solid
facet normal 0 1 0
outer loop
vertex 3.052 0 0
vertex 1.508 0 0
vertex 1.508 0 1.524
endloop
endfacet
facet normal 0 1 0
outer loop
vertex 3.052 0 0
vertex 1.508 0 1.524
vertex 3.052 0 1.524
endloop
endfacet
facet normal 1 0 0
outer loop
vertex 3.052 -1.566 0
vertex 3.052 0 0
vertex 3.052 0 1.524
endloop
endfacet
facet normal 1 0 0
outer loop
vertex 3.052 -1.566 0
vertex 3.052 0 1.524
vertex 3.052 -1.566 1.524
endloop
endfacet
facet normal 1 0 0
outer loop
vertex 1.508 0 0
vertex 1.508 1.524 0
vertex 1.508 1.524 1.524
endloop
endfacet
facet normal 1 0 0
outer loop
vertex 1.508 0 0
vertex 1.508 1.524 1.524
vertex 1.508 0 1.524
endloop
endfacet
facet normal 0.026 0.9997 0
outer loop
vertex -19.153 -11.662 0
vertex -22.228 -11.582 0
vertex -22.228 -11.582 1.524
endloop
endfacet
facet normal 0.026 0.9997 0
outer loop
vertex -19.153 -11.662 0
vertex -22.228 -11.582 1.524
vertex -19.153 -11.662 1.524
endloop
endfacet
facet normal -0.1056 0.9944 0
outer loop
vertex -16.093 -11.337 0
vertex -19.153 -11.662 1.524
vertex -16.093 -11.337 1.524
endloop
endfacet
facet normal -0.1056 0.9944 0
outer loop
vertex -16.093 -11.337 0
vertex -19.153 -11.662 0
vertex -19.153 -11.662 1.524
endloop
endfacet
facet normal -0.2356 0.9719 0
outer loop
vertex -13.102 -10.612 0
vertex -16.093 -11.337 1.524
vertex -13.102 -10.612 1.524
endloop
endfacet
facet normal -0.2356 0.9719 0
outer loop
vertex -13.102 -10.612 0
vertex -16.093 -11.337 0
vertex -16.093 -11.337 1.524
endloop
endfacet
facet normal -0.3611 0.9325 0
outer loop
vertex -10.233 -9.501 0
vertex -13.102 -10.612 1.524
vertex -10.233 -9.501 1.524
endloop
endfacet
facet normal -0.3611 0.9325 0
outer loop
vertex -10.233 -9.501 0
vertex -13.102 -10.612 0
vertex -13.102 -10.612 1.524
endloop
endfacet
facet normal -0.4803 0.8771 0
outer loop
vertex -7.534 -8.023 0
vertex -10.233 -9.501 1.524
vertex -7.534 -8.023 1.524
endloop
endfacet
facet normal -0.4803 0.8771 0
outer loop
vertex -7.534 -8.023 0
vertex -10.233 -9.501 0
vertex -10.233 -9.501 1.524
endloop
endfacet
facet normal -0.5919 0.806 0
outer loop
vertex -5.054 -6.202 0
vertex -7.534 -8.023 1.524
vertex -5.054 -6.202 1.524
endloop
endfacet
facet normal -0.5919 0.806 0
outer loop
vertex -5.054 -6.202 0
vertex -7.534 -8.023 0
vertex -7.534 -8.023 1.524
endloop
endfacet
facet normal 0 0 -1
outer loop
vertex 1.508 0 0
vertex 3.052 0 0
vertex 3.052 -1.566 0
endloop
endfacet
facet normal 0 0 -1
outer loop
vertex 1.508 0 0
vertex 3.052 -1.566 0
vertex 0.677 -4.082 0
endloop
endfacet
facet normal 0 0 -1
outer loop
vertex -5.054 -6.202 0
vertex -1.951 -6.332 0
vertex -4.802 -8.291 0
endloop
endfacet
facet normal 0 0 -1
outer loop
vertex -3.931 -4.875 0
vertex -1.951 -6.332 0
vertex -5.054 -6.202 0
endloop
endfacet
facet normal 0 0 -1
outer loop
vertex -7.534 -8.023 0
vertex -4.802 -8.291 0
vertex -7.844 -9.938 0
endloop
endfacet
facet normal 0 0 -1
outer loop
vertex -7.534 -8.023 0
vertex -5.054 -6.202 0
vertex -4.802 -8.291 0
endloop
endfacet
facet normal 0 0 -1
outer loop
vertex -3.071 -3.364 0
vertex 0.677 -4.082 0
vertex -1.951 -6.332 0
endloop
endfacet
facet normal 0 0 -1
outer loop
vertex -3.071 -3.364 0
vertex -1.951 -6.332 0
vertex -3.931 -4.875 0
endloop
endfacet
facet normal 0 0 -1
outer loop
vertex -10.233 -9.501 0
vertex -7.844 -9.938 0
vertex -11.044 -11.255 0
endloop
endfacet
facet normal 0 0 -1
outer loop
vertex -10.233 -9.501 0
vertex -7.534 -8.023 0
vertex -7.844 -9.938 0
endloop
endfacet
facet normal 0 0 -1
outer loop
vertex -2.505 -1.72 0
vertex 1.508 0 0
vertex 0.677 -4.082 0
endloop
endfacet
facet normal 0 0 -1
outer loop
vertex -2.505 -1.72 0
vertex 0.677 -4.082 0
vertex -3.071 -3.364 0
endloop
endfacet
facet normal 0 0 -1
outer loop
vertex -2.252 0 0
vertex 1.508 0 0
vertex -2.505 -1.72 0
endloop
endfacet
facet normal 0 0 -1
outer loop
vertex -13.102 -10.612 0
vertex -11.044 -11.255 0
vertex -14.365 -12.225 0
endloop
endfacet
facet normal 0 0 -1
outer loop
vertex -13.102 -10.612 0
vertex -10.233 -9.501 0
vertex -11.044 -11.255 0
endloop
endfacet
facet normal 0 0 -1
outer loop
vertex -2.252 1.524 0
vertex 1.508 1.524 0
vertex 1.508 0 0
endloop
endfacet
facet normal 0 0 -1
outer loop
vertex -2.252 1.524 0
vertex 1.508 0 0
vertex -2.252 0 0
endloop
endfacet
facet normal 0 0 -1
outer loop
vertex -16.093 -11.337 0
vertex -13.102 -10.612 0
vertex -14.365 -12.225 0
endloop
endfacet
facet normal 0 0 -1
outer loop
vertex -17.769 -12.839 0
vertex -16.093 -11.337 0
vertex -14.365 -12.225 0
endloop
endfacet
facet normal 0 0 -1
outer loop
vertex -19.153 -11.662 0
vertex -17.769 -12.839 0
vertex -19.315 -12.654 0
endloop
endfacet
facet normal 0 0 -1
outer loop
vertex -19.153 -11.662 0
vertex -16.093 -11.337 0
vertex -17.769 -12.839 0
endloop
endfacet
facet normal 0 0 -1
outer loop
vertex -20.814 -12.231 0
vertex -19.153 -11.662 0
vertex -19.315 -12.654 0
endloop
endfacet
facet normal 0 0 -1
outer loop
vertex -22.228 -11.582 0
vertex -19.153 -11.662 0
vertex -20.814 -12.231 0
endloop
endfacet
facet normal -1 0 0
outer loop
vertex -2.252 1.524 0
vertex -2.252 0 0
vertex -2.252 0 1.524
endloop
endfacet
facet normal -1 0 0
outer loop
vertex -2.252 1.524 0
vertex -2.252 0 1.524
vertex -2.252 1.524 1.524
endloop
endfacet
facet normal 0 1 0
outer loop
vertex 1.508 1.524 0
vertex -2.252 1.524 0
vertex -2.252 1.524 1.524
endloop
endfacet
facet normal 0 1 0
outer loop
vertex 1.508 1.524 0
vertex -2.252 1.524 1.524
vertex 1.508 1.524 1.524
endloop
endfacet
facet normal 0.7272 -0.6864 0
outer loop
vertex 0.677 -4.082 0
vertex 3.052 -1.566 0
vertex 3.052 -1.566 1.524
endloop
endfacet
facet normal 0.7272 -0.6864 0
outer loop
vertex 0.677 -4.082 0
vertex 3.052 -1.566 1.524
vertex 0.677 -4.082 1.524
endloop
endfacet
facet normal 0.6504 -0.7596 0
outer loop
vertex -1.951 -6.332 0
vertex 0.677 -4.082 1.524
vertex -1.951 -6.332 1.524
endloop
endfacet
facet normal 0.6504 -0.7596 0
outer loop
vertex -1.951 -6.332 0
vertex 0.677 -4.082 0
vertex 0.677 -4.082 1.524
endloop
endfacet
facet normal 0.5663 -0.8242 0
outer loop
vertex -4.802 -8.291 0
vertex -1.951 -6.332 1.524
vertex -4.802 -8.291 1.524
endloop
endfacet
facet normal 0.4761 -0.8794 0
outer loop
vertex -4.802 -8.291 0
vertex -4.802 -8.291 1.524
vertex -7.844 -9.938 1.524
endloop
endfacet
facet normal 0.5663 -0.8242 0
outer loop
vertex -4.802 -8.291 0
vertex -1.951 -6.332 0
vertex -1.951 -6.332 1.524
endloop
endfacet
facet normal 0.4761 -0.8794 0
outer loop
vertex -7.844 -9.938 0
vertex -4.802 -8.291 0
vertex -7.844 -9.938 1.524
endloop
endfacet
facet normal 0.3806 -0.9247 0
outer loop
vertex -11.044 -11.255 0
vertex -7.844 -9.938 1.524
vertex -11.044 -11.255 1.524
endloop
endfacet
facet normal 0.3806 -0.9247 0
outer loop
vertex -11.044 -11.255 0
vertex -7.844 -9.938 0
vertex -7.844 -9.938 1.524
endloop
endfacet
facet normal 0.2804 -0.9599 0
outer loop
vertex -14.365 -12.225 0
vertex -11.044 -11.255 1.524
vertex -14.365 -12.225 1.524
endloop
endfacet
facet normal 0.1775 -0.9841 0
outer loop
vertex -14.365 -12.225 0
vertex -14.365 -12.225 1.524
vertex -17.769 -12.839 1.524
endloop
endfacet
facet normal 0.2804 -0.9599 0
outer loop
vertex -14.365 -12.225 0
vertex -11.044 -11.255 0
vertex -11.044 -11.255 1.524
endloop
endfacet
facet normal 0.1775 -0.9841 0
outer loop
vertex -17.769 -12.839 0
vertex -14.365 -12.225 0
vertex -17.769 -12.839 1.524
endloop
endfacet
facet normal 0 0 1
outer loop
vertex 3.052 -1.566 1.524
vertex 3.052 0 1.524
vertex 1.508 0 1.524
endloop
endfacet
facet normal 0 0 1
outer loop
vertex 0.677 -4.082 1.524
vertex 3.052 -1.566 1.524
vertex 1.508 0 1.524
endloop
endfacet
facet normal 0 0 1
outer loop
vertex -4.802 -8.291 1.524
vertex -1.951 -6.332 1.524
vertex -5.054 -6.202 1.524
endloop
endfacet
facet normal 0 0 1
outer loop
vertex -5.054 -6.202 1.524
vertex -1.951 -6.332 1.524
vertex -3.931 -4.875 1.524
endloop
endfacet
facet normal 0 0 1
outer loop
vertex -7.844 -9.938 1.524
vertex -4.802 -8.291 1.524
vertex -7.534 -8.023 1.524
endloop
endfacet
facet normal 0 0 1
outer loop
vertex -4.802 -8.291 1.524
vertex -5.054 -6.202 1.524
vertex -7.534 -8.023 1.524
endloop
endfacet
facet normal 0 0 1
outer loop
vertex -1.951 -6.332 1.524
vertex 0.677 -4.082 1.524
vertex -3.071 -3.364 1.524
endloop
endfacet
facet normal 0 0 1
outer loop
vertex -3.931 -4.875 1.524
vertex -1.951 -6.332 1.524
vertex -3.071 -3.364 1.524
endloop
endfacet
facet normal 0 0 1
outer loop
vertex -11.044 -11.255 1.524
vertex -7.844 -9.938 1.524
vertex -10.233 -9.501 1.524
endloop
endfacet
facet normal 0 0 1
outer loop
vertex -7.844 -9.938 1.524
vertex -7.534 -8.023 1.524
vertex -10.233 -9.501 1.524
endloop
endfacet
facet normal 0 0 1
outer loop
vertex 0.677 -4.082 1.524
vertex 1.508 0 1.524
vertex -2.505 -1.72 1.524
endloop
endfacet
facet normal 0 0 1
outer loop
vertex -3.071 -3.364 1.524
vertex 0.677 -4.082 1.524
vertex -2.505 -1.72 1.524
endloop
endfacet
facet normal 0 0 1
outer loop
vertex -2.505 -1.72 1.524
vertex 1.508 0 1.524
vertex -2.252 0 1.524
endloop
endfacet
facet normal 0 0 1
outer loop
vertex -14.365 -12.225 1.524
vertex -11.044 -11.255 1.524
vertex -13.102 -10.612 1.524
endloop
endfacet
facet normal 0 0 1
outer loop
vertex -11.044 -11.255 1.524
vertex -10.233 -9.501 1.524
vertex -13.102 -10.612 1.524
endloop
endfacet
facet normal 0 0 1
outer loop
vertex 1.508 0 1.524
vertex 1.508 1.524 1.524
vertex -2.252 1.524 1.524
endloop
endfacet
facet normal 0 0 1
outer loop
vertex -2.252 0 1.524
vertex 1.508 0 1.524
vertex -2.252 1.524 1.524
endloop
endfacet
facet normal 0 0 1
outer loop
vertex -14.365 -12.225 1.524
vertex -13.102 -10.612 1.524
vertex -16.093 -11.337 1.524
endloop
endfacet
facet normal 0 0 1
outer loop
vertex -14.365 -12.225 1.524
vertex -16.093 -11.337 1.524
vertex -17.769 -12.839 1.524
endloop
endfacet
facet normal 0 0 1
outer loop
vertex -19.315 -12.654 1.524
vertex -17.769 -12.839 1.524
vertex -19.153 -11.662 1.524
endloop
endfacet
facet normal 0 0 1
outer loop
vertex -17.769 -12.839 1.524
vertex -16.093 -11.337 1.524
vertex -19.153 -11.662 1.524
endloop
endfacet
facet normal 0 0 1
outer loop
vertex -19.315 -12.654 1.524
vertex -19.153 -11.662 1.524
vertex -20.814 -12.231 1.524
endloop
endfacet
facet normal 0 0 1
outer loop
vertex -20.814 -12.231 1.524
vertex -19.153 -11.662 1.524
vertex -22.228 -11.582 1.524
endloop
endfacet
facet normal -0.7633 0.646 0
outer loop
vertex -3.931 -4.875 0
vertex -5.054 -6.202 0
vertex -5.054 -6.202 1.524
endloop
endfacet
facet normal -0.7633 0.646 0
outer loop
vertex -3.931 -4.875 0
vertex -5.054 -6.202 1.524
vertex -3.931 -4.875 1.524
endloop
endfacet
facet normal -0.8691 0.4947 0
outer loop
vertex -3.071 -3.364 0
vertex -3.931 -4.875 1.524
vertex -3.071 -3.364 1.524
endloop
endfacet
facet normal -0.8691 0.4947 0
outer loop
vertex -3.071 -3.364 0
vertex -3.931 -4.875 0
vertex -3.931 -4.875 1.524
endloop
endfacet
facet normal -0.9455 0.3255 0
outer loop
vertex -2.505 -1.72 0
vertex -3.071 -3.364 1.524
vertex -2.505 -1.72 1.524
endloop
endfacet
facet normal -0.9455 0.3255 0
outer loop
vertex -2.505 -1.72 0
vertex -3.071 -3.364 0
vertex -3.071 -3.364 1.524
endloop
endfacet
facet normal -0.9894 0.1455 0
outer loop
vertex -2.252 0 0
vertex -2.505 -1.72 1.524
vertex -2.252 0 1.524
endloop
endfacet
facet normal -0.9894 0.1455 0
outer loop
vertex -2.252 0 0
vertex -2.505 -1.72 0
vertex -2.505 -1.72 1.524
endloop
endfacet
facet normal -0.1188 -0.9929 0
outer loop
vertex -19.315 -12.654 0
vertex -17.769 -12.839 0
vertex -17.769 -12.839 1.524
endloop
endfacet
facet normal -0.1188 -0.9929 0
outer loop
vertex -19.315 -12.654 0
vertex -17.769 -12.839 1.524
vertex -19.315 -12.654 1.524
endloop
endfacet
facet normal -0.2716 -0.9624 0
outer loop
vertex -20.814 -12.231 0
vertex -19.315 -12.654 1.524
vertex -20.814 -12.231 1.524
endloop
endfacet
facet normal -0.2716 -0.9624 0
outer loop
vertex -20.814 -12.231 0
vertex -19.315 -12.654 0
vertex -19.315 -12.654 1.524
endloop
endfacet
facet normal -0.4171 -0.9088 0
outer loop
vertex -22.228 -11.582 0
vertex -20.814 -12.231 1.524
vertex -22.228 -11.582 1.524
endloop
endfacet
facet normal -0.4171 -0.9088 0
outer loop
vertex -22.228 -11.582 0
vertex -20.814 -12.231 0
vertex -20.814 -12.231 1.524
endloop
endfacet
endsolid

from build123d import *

# Parameters (mm, degrees)
BOSS_EXTRUDE1_DEPTH = 1.524


with BuildPart() as part:
    # Sketch1 → Boss-Extrude1 (new body)
    with BuildSketch(Plane.XY):
        with BuildLine():
            Line((1.507959842, 1.524), (1.507959842, 0))
            Line((1.507959842, 0), (3.052407177, 0))
            Line((3.052407177, 0), (3.052407177, -1.566256329))
            ThreePointArc((3.052407177, -1.566256329), (-6.301435783, -9.155076444), (-17.769362765, -12.838990069))
            ThreePointArc((-17.769362765, -12.838990069), (-20.072635935, -12.471877617), (-22.228452392, -11.581768494))
            ThreePointArc((-22.228452392, -11.581768494), (-13.1022498, -10.612386305), (-5.053668942, -6.202440528))
            ThreePointArc((-5.053668942, -6.202440528), (-3.071218913, -3.363942956), (-2.252033724, 0))
            Line((-2.252033724, 0), (-2.252033724, 1.524))
            Line((-2.252033724, 1.524), (1.507959842, 1.524))
        make_face()
    extrude(amount=BOSS_EXTRUDE1_DEPTH)


solid = part.part
